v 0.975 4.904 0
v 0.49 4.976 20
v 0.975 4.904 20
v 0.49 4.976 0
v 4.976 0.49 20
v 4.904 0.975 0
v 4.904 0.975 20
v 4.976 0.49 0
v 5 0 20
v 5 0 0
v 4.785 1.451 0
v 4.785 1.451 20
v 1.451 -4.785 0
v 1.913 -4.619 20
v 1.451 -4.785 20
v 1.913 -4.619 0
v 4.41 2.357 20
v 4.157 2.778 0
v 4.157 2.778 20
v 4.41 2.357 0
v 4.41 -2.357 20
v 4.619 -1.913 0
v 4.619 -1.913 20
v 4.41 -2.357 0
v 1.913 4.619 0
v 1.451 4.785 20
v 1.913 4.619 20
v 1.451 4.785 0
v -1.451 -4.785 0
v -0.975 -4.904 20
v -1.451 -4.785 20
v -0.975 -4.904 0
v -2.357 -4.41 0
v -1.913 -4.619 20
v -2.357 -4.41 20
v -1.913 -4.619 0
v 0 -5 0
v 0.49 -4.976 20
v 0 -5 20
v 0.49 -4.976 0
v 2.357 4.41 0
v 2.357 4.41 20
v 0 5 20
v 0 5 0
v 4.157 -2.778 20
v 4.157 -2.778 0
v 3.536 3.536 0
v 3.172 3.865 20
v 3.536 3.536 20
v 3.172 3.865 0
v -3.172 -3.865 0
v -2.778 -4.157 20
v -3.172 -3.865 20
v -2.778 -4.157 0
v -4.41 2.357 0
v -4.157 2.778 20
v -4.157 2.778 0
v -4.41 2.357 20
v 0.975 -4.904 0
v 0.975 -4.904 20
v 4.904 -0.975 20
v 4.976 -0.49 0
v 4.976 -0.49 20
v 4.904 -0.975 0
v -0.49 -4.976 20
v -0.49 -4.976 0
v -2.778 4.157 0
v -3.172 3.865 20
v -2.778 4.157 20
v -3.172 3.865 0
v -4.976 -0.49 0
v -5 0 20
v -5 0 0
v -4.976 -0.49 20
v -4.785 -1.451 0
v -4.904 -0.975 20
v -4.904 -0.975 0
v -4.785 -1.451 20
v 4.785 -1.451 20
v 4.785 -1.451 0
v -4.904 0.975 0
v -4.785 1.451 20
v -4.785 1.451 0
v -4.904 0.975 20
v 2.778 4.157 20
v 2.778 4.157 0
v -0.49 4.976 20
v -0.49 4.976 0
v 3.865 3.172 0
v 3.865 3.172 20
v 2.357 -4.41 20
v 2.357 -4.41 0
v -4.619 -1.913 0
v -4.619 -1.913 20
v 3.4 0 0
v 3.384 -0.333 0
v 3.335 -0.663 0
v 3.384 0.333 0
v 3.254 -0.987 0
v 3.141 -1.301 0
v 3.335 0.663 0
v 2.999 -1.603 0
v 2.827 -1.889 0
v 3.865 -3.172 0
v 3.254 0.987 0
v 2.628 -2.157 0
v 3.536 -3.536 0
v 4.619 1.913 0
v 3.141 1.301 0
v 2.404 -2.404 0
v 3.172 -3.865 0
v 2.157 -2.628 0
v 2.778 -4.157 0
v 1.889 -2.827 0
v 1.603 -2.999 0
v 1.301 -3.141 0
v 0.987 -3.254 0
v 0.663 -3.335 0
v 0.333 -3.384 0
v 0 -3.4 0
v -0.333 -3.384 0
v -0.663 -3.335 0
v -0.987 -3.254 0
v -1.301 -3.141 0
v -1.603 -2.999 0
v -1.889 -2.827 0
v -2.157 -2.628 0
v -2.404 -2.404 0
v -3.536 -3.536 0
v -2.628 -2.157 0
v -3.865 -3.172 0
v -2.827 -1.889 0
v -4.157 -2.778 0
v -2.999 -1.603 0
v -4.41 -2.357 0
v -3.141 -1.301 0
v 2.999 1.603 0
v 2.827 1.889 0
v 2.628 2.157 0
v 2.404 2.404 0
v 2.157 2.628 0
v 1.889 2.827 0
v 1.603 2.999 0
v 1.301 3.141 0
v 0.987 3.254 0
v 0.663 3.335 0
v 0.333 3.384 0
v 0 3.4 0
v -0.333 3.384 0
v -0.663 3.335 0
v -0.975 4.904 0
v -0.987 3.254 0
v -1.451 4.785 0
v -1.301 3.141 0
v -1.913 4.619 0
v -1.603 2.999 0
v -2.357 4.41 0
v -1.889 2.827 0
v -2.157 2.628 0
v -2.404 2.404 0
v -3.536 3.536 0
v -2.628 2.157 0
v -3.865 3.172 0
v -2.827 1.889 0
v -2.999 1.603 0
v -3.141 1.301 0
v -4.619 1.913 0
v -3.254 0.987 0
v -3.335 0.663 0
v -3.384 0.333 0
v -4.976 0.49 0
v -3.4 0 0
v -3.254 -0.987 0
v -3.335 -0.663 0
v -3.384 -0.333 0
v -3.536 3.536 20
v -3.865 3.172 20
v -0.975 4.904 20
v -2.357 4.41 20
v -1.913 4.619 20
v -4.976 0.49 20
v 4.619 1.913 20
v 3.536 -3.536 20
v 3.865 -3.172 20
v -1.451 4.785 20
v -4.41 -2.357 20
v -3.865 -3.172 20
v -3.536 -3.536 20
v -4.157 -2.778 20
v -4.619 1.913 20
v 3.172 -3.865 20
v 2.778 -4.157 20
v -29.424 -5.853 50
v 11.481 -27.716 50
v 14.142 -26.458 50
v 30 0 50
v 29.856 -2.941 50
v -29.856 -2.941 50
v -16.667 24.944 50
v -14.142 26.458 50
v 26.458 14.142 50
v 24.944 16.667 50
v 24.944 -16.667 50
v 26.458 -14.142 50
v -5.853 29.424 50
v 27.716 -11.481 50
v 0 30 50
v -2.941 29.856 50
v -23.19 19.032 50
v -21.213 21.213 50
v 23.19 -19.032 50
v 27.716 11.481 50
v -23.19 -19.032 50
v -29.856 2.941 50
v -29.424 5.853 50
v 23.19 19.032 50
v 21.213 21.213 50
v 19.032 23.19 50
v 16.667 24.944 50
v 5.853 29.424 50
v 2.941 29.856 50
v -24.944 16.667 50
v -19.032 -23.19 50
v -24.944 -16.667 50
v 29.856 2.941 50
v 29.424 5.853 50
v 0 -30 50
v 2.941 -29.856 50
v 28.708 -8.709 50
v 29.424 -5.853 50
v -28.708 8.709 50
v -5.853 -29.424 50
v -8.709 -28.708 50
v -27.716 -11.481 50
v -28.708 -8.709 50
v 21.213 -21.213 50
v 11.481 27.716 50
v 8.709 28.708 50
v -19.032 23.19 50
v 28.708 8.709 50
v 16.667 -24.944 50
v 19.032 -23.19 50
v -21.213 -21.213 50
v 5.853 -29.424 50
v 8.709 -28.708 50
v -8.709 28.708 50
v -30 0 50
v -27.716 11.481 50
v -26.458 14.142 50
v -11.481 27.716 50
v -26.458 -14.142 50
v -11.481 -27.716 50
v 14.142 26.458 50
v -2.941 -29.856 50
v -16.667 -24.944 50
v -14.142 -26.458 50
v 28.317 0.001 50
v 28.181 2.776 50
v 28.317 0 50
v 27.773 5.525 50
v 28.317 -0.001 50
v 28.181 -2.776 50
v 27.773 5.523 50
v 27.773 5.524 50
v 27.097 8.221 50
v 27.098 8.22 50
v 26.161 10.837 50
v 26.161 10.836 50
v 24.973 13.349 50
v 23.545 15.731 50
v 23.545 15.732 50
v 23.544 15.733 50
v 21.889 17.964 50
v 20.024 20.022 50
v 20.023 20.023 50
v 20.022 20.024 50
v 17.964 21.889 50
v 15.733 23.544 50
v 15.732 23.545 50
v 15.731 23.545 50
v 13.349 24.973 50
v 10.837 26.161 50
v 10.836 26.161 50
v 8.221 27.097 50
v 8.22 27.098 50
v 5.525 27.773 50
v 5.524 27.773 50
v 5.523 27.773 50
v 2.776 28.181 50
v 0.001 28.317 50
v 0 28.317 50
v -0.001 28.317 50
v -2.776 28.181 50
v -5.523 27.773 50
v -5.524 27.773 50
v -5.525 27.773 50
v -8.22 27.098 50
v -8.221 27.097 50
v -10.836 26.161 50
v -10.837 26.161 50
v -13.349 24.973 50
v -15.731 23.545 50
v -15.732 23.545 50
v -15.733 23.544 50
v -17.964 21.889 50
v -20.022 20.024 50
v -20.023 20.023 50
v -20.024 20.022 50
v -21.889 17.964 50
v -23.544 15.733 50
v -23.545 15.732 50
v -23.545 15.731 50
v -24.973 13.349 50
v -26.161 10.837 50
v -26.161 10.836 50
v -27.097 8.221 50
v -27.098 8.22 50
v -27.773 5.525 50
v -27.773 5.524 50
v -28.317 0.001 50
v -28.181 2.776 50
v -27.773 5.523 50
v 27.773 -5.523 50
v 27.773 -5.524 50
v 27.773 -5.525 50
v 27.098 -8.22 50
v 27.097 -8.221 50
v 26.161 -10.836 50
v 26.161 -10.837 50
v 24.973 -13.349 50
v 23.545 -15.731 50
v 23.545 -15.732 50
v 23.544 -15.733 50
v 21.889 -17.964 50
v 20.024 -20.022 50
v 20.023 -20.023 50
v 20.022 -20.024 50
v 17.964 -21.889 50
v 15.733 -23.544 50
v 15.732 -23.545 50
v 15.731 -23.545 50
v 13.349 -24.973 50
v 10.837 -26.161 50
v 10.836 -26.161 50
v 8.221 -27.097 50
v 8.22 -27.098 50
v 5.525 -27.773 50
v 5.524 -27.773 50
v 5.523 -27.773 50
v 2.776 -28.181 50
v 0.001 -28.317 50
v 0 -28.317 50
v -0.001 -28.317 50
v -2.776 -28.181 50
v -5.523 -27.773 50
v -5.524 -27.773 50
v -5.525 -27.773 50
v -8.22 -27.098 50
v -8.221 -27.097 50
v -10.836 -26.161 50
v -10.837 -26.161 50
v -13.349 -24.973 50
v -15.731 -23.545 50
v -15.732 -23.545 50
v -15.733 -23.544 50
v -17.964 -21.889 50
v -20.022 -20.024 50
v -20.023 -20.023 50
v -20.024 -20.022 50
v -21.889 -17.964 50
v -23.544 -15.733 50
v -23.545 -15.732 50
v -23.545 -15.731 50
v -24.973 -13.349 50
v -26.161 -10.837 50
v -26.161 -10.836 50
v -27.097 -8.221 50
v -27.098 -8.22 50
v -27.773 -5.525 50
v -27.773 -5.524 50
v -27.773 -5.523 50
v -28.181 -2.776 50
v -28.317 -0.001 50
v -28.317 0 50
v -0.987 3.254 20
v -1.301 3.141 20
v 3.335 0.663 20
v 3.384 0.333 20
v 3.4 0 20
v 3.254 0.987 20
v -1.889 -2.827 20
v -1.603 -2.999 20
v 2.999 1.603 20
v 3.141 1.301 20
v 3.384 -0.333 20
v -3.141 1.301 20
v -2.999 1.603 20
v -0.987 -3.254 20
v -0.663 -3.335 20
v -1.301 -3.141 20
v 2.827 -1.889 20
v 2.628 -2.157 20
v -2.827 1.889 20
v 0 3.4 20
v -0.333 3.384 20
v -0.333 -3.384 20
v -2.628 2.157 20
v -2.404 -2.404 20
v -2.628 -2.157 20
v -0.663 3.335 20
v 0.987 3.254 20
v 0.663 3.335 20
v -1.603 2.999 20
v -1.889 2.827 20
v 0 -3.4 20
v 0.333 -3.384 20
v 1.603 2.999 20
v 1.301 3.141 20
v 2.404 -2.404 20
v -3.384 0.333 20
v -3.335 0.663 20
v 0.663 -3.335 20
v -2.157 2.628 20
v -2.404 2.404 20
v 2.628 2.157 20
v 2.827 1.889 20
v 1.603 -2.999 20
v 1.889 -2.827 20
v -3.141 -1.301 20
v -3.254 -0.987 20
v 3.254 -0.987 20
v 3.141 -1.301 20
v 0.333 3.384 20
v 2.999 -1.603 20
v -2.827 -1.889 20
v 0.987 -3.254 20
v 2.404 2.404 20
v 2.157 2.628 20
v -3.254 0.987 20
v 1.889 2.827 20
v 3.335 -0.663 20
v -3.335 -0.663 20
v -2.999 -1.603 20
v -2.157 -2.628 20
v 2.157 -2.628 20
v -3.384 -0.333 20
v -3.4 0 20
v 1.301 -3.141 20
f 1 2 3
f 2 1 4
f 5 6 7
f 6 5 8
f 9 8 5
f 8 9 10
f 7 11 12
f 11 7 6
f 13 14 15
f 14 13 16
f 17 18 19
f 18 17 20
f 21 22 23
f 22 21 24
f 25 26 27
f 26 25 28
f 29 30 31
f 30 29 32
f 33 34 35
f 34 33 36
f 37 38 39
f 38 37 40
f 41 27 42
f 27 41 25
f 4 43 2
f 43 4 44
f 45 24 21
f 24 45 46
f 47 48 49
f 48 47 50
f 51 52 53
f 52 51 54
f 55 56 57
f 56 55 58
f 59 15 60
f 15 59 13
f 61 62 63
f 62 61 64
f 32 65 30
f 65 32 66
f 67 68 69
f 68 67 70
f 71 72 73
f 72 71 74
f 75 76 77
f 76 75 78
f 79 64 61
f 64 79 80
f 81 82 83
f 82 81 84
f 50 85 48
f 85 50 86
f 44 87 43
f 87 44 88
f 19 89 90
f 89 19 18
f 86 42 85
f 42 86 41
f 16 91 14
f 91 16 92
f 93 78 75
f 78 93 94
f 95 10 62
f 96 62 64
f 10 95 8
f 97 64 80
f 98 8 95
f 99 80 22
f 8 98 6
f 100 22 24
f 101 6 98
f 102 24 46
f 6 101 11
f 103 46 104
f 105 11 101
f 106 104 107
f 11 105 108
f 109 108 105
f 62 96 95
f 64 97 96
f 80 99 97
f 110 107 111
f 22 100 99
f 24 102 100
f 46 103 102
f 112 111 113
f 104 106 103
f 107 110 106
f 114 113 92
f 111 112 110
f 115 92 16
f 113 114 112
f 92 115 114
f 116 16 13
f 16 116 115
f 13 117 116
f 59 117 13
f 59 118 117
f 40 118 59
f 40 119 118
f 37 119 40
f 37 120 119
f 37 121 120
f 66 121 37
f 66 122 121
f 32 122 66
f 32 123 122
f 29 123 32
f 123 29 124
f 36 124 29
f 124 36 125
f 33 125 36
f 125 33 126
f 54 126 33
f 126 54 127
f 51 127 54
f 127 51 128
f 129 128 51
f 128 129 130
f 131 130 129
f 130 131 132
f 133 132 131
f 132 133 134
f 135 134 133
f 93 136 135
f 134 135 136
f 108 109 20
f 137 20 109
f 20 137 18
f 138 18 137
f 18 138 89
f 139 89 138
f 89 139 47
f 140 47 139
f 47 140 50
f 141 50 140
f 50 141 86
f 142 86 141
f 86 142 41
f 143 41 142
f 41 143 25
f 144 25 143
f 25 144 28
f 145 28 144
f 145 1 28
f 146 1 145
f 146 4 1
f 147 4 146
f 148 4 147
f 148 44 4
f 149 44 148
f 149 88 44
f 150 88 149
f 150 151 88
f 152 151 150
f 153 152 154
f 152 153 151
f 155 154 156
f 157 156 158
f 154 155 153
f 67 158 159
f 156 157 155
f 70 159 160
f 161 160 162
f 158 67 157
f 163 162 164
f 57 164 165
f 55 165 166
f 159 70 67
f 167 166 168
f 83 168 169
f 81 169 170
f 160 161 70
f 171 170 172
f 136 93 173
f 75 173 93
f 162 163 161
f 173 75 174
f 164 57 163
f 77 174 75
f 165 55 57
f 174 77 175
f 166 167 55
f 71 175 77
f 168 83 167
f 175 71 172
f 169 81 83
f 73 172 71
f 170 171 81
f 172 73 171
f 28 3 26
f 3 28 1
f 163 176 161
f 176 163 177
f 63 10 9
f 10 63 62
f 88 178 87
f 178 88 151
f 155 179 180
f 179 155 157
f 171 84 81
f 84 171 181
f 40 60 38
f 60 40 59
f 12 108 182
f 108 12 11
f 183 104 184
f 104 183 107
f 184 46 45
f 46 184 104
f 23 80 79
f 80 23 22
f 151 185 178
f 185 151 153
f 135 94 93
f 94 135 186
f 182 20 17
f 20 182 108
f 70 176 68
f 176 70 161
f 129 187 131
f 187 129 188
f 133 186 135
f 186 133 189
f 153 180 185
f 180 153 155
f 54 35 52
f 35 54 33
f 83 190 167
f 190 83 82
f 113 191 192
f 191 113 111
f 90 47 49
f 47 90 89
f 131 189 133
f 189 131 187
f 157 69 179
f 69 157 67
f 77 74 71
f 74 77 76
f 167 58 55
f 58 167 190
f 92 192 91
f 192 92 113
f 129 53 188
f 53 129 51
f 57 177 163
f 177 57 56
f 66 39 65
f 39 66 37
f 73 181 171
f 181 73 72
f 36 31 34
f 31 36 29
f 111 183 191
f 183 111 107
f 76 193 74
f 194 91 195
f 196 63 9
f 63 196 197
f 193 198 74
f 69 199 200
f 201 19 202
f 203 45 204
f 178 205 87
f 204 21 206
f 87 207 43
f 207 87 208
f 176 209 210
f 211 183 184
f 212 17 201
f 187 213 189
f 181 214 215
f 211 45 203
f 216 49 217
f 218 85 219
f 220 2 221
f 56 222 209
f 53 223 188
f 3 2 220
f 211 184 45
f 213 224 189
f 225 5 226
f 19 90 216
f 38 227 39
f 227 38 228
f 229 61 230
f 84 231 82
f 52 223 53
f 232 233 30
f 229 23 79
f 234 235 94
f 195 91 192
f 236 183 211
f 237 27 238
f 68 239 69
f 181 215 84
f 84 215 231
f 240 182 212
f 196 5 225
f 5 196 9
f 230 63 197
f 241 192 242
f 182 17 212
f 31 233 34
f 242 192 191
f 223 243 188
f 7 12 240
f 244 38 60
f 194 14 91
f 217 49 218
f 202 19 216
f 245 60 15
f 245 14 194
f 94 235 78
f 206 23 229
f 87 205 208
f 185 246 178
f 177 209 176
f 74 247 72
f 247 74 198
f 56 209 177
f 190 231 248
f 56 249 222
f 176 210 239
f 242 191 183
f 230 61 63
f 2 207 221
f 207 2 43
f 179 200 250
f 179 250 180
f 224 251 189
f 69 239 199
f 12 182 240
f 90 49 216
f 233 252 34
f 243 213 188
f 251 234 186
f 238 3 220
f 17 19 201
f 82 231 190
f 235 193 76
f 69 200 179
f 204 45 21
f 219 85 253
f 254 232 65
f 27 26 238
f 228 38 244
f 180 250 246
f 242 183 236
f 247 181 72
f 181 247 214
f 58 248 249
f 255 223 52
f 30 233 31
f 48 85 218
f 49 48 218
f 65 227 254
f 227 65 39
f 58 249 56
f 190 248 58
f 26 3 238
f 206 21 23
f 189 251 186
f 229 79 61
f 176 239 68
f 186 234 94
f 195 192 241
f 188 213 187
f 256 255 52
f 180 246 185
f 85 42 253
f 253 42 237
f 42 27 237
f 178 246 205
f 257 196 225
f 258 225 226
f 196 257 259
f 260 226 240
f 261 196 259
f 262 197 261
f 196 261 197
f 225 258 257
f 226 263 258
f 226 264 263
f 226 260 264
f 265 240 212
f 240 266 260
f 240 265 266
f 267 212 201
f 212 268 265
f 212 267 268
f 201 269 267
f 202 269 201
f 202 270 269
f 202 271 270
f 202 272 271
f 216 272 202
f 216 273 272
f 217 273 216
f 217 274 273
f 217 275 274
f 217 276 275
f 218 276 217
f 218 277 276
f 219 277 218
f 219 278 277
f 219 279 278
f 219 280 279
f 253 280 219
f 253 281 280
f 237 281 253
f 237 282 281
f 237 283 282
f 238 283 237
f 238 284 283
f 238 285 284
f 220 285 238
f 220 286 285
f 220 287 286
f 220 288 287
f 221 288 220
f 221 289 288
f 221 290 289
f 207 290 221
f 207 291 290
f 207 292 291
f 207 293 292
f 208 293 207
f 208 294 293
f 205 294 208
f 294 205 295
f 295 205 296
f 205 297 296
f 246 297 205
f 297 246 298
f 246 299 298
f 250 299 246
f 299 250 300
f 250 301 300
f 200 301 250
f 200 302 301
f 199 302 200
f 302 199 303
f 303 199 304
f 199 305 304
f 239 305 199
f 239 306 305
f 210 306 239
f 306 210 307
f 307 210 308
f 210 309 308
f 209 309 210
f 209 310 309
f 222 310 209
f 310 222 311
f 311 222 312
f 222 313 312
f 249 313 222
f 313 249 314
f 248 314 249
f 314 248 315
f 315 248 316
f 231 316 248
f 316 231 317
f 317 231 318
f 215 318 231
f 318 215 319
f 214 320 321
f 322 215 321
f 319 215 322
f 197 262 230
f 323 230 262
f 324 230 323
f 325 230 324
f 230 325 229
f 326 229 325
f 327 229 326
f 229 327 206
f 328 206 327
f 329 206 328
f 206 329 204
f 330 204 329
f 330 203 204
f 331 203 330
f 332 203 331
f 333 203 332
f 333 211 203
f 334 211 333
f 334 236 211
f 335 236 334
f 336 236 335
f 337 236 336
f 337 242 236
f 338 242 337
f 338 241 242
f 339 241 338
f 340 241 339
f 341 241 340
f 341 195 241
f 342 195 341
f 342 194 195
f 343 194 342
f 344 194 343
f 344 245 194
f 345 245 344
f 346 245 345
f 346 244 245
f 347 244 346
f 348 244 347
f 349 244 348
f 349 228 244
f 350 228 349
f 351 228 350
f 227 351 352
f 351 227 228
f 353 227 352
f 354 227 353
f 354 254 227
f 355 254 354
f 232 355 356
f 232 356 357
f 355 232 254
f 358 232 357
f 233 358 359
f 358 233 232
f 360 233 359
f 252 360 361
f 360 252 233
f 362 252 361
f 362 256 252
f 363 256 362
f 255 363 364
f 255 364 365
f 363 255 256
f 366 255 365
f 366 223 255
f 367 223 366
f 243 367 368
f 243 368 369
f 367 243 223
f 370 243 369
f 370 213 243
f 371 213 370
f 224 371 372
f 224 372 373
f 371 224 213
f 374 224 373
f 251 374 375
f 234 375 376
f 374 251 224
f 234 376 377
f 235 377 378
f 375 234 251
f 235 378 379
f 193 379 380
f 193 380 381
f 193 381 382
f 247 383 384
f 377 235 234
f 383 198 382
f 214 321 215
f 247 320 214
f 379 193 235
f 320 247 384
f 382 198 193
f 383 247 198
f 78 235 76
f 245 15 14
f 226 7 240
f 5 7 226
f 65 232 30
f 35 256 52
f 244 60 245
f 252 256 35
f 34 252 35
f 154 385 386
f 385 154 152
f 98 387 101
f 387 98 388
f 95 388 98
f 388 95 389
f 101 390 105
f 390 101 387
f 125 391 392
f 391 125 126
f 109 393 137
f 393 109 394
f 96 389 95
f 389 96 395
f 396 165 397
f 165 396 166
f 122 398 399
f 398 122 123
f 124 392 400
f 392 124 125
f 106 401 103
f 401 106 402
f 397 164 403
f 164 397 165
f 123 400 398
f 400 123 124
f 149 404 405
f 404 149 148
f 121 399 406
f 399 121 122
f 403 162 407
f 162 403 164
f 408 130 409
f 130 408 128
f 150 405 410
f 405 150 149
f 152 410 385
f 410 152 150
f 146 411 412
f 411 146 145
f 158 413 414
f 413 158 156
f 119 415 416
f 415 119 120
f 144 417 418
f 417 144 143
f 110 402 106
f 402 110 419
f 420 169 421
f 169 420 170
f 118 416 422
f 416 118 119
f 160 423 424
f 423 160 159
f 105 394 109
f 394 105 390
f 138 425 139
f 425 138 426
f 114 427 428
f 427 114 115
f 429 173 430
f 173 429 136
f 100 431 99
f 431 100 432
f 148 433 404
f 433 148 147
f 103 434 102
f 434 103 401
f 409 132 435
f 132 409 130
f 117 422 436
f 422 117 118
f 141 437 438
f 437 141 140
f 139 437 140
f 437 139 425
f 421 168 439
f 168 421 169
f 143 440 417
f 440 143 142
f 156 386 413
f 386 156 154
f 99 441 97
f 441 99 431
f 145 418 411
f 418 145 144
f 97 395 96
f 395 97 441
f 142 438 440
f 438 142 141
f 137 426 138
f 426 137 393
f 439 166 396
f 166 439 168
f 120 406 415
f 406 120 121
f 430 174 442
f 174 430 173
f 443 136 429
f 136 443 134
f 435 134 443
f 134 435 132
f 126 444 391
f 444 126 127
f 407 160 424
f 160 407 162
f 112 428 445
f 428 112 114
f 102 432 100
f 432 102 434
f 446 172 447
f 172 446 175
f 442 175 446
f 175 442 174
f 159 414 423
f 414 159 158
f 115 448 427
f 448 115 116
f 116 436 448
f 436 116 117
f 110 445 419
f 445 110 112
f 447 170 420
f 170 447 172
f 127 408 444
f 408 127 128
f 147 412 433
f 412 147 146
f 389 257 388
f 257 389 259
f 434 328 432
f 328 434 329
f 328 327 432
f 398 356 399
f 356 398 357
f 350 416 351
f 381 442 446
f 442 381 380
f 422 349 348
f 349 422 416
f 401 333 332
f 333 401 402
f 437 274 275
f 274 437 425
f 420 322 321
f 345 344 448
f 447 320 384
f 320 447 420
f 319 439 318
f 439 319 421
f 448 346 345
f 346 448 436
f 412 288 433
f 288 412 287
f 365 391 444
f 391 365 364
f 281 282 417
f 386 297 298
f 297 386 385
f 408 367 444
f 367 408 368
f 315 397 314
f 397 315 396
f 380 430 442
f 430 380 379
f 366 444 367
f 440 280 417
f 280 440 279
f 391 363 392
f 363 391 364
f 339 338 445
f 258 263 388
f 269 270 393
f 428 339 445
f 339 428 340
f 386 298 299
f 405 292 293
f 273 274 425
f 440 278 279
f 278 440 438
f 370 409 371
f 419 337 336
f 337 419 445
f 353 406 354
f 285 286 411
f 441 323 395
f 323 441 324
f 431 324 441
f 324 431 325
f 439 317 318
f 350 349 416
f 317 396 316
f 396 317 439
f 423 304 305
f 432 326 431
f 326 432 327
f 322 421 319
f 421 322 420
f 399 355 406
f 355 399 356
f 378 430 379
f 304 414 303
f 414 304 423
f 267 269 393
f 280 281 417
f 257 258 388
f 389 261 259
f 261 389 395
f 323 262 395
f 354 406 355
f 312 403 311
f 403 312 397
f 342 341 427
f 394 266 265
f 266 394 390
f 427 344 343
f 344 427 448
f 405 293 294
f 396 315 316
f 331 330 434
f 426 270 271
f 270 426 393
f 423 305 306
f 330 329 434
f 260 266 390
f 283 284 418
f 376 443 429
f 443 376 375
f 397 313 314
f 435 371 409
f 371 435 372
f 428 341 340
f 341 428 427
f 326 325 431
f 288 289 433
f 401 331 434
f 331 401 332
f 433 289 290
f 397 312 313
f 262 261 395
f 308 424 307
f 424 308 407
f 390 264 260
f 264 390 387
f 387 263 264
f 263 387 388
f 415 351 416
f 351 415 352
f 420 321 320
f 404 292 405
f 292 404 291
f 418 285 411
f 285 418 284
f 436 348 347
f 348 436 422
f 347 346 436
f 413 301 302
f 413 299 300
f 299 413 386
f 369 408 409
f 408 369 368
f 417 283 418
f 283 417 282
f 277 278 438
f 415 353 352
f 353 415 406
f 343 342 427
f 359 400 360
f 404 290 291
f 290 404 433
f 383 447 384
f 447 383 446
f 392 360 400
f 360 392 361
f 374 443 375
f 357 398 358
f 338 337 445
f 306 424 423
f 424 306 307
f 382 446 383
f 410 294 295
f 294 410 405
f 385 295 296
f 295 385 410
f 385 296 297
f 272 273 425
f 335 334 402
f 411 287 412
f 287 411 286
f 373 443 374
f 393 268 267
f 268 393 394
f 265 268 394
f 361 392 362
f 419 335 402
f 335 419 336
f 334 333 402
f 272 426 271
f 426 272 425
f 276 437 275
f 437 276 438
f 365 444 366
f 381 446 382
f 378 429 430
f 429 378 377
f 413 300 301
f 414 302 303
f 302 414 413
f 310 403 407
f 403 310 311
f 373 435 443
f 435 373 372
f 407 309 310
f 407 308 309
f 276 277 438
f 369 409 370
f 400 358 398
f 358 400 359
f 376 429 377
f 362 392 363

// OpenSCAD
// Lab Funnel - OpenSCAD Model
// Dimensions measured in millimetres

// Spout dimensions
spout_outer_diameter = 10;          // Outer diameter of the spout (mm)
spout_inner_diameter = 6.8;         // Inner diameter (bore) of the spout (mm)
spout_height = 20;                  // Height of the straight spout section (mm)

// Cone dimensions
cone_bottom_outer_diameter = 10;    // Outer diameter at the base of the cone (matches spout) (mm)
cone_top_outer_diameter = 60;       // Outer diameter at the rim of the funnel (mm)
cone_height = 30;                   // Height of the cone section (z=20 to z=50) (mm)

// Wall thickness
wall_thickness = 1.6;               // Uniform wall thickness (mm)

// Derived dimensions
cone_bottom_inner_diameter = cone_bottom_outer_diameter - 2 * wall_thickness; // 6.8 mm
cone_top_inner_diameter = cone_top_outer_diameter - 2 * wall_thickness;       // 56.8 mm

// Resolution for smooth curves
$fn = 64;

// Main funnel body
// The part must rest on z=0. The previous version had cutouts extending below z=0,
// causing the bounding box to start at z=-0.05. We fix this by ensuring all
// geometry is strictly >= 0.

difference() {
    union() {
        // Spout section (z = 0 to z = 20)
        // Outer cylinder
        translate([0, 0, 0])
            cylinder(h = spout_height, r = spout_outer_diameter / 2, center = false);
        
        // Cone section (z = 20 to z = 50)
        // Outer cone
        translate([0, 0, spout_height])
            cylinder(h = cone_height, r1 = cone_bottom_outer_diameter / 2, r2 = cone_top_outer_diameter / 2, center = false);
    }
    
    // Cutouts for the bore
    // Spout inner bore: starts exactly at z=0, extends slightly past the junction with the cone
    translate([0, 0, 0])
        cylinder(h = spout_height + 0.1, r = spout_inner_diameter / 2, center = false);
    
    // Cone inner bore: starts at the junction (z=20), extends slightly past the top rim
    translate([0, 0, spout_height])
        cylinder(h = cone_height + 0.1, r1 = cone_bottom_inner_diameter / 2, r2 = cone_top_inner_diameter / 2, center = false);
}
